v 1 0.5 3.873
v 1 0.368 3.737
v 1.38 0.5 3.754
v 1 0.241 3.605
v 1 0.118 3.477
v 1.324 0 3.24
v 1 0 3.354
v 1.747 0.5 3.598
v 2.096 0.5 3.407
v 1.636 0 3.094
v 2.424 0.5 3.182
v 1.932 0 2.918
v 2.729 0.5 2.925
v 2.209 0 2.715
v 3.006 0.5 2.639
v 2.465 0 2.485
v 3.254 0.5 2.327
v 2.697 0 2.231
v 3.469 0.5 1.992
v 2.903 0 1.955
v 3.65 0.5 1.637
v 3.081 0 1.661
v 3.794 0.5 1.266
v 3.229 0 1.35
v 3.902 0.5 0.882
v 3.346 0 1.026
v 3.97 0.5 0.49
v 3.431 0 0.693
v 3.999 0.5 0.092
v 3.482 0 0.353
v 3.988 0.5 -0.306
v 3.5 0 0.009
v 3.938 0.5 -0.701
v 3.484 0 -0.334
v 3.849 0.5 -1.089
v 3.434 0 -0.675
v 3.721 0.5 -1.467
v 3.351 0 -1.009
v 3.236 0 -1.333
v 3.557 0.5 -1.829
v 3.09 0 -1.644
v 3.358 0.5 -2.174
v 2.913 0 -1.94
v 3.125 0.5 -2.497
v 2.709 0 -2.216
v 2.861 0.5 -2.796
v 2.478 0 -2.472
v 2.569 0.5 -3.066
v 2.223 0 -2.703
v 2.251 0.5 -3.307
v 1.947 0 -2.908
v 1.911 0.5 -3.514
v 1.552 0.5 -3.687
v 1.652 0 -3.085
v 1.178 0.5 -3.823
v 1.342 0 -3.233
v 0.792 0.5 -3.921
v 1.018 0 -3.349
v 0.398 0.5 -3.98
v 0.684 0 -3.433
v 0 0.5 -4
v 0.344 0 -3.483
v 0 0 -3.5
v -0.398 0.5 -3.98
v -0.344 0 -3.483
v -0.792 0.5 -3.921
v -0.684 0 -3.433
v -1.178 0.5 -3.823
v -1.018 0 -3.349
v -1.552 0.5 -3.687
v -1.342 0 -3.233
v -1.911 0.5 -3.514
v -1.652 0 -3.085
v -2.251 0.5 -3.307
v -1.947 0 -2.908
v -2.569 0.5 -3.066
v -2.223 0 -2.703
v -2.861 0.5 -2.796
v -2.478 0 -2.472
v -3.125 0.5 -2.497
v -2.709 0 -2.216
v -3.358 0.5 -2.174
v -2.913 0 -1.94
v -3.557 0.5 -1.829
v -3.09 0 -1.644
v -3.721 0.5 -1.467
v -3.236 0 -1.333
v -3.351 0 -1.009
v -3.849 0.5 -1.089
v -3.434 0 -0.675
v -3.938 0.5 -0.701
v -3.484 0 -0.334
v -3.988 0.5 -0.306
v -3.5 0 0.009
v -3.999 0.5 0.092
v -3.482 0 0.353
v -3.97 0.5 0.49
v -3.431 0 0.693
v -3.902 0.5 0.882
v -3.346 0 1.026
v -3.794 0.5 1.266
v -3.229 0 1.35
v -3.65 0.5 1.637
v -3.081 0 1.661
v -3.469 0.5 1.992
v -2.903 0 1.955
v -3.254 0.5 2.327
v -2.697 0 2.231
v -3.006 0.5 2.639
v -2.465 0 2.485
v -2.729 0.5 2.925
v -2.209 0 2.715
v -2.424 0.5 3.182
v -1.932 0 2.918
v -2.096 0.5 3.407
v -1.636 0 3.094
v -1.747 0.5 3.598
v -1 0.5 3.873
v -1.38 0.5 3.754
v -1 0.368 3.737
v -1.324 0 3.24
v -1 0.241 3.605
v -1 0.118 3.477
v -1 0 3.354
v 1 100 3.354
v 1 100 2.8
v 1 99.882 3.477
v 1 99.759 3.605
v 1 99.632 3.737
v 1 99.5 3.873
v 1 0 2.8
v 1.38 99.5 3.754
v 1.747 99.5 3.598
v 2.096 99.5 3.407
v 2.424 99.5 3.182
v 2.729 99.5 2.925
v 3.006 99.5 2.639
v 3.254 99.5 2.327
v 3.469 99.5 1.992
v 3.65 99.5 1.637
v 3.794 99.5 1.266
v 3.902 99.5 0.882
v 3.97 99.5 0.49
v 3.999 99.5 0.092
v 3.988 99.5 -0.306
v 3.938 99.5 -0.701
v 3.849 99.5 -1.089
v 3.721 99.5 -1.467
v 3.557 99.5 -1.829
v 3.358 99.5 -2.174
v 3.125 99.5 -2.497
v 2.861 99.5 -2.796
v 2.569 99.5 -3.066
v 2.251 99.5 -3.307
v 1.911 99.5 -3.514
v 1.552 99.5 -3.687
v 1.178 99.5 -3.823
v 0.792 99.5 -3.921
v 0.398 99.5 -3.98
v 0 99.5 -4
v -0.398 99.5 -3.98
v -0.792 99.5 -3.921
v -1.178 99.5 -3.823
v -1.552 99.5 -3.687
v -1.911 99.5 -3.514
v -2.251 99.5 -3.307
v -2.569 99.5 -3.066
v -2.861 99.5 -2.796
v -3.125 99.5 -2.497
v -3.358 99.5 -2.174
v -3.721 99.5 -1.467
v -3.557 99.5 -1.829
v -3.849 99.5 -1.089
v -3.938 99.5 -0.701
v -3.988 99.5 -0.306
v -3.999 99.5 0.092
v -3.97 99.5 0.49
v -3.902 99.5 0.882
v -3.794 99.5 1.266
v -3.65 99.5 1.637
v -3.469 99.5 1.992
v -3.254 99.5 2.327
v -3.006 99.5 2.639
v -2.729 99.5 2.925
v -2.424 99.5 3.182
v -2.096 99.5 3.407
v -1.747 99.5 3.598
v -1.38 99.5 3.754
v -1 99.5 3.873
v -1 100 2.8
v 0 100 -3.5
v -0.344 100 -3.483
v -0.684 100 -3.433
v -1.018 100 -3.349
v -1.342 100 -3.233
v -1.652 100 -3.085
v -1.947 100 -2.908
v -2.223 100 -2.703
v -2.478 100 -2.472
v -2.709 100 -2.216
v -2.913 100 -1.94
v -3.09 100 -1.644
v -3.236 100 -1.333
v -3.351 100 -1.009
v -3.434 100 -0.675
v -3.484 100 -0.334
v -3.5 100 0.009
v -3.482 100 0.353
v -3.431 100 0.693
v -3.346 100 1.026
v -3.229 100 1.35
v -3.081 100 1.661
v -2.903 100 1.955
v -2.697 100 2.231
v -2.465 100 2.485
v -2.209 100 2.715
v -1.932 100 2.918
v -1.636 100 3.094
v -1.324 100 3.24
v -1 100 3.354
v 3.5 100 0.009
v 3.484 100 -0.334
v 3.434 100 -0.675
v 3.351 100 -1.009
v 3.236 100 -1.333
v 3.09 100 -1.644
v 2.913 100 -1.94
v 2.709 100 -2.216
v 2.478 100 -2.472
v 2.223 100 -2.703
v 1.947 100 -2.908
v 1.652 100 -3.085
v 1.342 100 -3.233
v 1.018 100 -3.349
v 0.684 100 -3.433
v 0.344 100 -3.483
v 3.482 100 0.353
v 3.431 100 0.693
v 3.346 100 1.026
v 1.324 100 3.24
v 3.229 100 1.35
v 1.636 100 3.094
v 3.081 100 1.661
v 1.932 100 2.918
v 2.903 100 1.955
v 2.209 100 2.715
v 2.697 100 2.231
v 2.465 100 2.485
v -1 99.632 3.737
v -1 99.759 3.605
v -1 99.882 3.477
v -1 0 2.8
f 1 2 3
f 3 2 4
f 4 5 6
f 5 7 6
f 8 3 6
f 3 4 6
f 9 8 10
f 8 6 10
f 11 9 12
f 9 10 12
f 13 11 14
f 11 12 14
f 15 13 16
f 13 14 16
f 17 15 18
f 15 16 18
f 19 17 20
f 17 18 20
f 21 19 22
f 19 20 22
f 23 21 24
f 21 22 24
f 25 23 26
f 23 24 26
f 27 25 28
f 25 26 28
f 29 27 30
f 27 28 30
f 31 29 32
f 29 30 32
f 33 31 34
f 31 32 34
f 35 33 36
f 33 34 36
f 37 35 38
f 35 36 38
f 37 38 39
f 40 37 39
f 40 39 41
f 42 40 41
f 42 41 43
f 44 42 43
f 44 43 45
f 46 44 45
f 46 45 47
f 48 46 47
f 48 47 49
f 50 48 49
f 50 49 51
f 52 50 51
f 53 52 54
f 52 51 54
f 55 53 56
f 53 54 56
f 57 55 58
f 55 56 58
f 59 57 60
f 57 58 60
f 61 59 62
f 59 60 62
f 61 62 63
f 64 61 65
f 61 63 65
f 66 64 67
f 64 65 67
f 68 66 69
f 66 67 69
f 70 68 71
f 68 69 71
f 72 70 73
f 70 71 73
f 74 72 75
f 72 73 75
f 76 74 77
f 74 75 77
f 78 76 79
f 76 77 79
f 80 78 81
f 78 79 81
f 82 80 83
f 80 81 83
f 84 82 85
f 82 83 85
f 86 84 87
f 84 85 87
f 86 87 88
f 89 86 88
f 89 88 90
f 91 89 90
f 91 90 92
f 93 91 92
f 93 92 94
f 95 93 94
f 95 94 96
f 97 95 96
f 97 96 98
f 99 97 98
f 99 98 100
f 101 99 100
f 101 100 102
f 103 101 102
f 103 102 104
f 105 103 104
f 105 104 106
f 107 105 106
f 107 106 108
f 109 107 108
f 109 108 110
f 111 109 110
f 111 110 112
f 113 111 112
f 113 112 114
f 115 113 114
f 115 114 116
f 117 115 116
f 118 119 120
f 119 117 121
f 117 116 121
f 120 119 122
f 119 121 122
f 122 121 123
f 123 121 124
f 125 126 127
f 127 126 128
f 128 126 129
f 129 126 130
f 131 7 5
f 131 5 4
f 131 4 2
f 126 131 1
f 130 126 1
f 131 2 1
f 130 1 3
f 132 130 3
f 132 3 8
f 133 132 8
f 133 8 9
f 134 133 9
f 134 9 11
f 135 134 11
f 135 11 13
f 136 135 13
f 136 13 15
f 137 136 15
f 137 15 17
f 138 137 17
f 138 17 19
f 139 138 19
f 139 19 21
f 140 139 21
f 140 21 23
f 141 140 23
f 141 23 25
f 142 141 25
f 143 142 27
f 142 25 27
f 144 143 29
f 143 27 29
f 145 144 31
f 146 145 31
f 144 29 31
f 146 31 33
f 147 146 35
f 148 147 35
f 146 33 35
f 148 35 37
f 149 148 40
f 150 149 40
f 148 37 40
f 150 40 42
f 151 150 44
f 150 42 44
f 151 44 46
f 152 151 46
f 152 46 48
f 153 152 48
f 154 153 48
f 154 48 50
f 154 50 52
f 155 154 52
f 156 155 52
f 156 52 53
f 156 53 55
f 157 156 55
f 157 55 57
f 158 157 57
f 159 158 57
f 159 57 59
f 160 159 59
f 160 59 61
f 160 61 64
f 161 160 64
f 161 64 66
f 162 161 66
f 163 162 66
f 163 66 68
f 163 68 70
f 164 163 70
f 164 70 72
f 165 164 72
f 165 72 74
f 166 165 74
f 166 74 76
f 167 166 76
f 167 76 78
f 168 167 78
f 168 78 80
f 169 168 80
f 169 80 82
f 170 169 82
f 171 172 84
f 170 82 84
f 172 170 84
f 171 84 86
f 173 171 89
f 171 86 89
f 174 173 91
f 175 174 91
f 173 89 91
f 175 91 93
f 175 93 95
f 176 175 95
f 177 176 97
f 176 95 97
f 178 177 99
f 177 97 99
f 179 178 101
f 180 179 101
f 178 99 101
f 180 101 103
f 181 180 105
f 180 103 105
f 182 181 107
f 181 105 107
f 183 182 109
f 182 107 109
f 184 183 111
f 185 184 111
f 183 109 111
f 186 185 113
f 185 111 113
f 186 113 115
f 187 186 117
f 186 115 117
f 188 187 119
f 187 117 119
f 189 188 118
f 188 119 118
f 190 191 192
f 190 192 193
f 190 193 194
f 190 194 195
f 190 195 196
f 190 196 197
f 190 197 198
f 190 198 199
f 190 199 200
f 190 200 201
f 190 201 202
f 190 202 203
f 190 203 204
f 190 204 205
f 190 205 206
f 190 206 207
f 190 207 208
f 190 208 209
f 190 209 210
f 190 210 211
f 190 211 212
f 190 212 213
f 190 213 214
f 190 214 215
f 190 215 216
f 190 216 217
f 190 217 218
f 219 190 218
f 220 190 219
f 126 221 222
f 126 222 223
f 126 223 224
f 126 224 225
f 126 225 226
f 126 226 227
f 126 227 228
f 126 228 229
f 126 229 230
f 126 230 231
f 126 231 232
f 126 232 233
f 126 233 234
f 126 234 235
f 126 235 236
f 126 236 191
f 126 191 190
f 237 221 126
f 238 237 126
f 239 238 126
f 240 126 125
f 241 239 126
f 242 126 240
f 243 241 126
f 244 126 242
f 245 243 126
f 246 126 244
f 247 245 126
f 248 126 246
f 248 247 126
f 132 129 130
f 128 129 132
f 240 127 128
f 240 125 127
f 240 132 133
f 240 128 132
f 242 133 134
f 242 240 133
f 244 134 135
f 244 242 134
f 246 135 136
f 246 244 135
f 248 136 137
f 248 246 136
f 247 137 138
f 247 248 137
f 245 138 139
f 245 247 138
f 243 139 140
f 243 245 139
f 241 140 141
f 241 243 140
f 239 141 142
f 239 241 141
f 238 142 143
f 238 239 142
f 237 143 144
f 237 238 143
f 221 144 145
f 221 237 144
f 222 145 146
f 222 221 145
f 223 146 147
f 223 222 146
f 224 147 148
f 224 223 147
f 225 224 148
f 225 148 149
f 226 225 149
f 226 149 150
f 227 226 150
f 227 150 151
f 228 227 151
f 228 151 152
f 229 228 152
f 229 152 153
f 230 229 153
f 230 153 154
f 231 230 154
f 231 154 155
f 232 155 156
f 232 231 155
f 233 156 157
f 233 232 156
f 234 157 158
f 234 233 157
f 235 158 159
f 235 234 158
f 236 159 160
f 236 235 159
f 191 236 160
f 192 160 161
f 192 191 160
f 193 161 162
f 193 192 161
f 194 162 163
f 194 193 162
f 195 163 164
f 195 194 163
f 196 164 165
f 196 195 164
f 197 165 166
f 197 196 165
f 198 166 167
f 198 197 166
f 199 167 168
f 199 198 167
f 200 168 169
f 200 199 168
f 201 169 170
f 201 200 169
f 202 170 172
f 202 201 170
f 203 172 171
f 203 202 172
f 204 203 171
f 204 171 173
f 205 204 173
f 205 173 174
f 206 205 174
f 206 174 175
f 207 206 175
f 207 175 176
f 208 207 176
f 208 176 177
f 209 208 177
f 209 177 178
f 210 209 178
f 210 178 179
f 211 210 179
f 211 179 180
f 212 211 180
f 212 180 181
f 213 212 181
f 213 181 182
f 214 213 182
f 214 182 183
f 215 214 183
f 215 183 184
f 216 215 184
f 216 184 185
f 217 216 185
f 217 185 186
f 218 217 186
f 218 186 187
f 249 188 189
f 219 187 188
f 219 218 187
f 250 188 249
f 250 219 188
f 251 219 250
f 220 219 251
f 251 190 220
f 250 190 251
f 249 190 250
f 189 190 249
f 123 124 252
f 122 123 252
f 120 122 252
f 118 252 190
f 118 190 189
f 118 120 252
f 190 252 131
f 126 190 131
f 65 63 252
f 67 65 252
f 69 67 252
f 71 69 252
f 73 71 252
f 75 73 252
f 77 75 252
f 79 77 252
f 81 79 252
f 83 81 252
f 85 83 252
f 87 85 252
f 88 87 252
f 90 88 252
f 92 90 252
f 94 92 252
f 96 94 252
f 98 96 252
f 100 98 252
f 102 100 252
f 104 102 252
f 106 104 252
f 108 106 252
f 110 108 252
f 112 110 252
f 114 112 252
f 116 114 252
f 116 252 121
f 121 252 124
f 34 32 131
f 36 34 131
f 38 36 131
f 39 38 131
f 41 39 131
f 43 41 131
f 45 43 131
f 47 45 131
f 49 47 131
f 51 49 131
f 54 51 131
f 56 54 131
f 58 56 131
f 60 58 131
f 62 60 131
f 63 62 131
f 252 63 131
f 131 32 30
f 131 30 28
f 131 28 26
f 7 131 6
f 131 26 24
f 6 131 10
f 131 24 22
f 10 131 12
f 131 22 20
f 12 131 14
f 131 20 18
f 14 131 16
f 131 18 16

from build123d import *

# Parameters (mm, degrees)
SKETCH1_R           = 4
BOSS_EXTRUDE1_DEPTH = 100
SKETCH2_W           = 2
SKETCH2_H           = 2
CUT_EXTRUDE1_DEPTH  = 101.159872204
CHAMFER1_SIZE       = 0.5


with BuildPart() as part:
    # Sketch1 → Boss-Extrude1 (new body)
    with BuildSketch(Plane(origin=(0, 0, 0), x_dir=(1, 0, 0), z_dir=(0, 1, 0))):
        with Locations(Location((0, 0, 0), (0, 0, 270))):
            Circle(SKETCH1_R)
    extrude(amount=BOSS_EXTRUDE1_DEPTH)

    # Sketch2 → Cut-Extrude1 (cut, through all)
    with BuildSketch(Plane.XZ):
        with Locations((0, 3.8)):
            Rectangle(SKETCH2_W, SKETCH2_H)
    extrude(amount=-CUT_EXTRUDE1_DEPTH, mode=Mode.SUBTRACT)

    # Chamfer1
    chamfer1_edges = [part.edges().sort_by_distance(p)[0] for p in [
        (0, 0, -4),
        (0, 100, -4),
    ]]
    chamfer(chamfer1_edges, length=CHAMFER1_SIZE)


solid = part.part
